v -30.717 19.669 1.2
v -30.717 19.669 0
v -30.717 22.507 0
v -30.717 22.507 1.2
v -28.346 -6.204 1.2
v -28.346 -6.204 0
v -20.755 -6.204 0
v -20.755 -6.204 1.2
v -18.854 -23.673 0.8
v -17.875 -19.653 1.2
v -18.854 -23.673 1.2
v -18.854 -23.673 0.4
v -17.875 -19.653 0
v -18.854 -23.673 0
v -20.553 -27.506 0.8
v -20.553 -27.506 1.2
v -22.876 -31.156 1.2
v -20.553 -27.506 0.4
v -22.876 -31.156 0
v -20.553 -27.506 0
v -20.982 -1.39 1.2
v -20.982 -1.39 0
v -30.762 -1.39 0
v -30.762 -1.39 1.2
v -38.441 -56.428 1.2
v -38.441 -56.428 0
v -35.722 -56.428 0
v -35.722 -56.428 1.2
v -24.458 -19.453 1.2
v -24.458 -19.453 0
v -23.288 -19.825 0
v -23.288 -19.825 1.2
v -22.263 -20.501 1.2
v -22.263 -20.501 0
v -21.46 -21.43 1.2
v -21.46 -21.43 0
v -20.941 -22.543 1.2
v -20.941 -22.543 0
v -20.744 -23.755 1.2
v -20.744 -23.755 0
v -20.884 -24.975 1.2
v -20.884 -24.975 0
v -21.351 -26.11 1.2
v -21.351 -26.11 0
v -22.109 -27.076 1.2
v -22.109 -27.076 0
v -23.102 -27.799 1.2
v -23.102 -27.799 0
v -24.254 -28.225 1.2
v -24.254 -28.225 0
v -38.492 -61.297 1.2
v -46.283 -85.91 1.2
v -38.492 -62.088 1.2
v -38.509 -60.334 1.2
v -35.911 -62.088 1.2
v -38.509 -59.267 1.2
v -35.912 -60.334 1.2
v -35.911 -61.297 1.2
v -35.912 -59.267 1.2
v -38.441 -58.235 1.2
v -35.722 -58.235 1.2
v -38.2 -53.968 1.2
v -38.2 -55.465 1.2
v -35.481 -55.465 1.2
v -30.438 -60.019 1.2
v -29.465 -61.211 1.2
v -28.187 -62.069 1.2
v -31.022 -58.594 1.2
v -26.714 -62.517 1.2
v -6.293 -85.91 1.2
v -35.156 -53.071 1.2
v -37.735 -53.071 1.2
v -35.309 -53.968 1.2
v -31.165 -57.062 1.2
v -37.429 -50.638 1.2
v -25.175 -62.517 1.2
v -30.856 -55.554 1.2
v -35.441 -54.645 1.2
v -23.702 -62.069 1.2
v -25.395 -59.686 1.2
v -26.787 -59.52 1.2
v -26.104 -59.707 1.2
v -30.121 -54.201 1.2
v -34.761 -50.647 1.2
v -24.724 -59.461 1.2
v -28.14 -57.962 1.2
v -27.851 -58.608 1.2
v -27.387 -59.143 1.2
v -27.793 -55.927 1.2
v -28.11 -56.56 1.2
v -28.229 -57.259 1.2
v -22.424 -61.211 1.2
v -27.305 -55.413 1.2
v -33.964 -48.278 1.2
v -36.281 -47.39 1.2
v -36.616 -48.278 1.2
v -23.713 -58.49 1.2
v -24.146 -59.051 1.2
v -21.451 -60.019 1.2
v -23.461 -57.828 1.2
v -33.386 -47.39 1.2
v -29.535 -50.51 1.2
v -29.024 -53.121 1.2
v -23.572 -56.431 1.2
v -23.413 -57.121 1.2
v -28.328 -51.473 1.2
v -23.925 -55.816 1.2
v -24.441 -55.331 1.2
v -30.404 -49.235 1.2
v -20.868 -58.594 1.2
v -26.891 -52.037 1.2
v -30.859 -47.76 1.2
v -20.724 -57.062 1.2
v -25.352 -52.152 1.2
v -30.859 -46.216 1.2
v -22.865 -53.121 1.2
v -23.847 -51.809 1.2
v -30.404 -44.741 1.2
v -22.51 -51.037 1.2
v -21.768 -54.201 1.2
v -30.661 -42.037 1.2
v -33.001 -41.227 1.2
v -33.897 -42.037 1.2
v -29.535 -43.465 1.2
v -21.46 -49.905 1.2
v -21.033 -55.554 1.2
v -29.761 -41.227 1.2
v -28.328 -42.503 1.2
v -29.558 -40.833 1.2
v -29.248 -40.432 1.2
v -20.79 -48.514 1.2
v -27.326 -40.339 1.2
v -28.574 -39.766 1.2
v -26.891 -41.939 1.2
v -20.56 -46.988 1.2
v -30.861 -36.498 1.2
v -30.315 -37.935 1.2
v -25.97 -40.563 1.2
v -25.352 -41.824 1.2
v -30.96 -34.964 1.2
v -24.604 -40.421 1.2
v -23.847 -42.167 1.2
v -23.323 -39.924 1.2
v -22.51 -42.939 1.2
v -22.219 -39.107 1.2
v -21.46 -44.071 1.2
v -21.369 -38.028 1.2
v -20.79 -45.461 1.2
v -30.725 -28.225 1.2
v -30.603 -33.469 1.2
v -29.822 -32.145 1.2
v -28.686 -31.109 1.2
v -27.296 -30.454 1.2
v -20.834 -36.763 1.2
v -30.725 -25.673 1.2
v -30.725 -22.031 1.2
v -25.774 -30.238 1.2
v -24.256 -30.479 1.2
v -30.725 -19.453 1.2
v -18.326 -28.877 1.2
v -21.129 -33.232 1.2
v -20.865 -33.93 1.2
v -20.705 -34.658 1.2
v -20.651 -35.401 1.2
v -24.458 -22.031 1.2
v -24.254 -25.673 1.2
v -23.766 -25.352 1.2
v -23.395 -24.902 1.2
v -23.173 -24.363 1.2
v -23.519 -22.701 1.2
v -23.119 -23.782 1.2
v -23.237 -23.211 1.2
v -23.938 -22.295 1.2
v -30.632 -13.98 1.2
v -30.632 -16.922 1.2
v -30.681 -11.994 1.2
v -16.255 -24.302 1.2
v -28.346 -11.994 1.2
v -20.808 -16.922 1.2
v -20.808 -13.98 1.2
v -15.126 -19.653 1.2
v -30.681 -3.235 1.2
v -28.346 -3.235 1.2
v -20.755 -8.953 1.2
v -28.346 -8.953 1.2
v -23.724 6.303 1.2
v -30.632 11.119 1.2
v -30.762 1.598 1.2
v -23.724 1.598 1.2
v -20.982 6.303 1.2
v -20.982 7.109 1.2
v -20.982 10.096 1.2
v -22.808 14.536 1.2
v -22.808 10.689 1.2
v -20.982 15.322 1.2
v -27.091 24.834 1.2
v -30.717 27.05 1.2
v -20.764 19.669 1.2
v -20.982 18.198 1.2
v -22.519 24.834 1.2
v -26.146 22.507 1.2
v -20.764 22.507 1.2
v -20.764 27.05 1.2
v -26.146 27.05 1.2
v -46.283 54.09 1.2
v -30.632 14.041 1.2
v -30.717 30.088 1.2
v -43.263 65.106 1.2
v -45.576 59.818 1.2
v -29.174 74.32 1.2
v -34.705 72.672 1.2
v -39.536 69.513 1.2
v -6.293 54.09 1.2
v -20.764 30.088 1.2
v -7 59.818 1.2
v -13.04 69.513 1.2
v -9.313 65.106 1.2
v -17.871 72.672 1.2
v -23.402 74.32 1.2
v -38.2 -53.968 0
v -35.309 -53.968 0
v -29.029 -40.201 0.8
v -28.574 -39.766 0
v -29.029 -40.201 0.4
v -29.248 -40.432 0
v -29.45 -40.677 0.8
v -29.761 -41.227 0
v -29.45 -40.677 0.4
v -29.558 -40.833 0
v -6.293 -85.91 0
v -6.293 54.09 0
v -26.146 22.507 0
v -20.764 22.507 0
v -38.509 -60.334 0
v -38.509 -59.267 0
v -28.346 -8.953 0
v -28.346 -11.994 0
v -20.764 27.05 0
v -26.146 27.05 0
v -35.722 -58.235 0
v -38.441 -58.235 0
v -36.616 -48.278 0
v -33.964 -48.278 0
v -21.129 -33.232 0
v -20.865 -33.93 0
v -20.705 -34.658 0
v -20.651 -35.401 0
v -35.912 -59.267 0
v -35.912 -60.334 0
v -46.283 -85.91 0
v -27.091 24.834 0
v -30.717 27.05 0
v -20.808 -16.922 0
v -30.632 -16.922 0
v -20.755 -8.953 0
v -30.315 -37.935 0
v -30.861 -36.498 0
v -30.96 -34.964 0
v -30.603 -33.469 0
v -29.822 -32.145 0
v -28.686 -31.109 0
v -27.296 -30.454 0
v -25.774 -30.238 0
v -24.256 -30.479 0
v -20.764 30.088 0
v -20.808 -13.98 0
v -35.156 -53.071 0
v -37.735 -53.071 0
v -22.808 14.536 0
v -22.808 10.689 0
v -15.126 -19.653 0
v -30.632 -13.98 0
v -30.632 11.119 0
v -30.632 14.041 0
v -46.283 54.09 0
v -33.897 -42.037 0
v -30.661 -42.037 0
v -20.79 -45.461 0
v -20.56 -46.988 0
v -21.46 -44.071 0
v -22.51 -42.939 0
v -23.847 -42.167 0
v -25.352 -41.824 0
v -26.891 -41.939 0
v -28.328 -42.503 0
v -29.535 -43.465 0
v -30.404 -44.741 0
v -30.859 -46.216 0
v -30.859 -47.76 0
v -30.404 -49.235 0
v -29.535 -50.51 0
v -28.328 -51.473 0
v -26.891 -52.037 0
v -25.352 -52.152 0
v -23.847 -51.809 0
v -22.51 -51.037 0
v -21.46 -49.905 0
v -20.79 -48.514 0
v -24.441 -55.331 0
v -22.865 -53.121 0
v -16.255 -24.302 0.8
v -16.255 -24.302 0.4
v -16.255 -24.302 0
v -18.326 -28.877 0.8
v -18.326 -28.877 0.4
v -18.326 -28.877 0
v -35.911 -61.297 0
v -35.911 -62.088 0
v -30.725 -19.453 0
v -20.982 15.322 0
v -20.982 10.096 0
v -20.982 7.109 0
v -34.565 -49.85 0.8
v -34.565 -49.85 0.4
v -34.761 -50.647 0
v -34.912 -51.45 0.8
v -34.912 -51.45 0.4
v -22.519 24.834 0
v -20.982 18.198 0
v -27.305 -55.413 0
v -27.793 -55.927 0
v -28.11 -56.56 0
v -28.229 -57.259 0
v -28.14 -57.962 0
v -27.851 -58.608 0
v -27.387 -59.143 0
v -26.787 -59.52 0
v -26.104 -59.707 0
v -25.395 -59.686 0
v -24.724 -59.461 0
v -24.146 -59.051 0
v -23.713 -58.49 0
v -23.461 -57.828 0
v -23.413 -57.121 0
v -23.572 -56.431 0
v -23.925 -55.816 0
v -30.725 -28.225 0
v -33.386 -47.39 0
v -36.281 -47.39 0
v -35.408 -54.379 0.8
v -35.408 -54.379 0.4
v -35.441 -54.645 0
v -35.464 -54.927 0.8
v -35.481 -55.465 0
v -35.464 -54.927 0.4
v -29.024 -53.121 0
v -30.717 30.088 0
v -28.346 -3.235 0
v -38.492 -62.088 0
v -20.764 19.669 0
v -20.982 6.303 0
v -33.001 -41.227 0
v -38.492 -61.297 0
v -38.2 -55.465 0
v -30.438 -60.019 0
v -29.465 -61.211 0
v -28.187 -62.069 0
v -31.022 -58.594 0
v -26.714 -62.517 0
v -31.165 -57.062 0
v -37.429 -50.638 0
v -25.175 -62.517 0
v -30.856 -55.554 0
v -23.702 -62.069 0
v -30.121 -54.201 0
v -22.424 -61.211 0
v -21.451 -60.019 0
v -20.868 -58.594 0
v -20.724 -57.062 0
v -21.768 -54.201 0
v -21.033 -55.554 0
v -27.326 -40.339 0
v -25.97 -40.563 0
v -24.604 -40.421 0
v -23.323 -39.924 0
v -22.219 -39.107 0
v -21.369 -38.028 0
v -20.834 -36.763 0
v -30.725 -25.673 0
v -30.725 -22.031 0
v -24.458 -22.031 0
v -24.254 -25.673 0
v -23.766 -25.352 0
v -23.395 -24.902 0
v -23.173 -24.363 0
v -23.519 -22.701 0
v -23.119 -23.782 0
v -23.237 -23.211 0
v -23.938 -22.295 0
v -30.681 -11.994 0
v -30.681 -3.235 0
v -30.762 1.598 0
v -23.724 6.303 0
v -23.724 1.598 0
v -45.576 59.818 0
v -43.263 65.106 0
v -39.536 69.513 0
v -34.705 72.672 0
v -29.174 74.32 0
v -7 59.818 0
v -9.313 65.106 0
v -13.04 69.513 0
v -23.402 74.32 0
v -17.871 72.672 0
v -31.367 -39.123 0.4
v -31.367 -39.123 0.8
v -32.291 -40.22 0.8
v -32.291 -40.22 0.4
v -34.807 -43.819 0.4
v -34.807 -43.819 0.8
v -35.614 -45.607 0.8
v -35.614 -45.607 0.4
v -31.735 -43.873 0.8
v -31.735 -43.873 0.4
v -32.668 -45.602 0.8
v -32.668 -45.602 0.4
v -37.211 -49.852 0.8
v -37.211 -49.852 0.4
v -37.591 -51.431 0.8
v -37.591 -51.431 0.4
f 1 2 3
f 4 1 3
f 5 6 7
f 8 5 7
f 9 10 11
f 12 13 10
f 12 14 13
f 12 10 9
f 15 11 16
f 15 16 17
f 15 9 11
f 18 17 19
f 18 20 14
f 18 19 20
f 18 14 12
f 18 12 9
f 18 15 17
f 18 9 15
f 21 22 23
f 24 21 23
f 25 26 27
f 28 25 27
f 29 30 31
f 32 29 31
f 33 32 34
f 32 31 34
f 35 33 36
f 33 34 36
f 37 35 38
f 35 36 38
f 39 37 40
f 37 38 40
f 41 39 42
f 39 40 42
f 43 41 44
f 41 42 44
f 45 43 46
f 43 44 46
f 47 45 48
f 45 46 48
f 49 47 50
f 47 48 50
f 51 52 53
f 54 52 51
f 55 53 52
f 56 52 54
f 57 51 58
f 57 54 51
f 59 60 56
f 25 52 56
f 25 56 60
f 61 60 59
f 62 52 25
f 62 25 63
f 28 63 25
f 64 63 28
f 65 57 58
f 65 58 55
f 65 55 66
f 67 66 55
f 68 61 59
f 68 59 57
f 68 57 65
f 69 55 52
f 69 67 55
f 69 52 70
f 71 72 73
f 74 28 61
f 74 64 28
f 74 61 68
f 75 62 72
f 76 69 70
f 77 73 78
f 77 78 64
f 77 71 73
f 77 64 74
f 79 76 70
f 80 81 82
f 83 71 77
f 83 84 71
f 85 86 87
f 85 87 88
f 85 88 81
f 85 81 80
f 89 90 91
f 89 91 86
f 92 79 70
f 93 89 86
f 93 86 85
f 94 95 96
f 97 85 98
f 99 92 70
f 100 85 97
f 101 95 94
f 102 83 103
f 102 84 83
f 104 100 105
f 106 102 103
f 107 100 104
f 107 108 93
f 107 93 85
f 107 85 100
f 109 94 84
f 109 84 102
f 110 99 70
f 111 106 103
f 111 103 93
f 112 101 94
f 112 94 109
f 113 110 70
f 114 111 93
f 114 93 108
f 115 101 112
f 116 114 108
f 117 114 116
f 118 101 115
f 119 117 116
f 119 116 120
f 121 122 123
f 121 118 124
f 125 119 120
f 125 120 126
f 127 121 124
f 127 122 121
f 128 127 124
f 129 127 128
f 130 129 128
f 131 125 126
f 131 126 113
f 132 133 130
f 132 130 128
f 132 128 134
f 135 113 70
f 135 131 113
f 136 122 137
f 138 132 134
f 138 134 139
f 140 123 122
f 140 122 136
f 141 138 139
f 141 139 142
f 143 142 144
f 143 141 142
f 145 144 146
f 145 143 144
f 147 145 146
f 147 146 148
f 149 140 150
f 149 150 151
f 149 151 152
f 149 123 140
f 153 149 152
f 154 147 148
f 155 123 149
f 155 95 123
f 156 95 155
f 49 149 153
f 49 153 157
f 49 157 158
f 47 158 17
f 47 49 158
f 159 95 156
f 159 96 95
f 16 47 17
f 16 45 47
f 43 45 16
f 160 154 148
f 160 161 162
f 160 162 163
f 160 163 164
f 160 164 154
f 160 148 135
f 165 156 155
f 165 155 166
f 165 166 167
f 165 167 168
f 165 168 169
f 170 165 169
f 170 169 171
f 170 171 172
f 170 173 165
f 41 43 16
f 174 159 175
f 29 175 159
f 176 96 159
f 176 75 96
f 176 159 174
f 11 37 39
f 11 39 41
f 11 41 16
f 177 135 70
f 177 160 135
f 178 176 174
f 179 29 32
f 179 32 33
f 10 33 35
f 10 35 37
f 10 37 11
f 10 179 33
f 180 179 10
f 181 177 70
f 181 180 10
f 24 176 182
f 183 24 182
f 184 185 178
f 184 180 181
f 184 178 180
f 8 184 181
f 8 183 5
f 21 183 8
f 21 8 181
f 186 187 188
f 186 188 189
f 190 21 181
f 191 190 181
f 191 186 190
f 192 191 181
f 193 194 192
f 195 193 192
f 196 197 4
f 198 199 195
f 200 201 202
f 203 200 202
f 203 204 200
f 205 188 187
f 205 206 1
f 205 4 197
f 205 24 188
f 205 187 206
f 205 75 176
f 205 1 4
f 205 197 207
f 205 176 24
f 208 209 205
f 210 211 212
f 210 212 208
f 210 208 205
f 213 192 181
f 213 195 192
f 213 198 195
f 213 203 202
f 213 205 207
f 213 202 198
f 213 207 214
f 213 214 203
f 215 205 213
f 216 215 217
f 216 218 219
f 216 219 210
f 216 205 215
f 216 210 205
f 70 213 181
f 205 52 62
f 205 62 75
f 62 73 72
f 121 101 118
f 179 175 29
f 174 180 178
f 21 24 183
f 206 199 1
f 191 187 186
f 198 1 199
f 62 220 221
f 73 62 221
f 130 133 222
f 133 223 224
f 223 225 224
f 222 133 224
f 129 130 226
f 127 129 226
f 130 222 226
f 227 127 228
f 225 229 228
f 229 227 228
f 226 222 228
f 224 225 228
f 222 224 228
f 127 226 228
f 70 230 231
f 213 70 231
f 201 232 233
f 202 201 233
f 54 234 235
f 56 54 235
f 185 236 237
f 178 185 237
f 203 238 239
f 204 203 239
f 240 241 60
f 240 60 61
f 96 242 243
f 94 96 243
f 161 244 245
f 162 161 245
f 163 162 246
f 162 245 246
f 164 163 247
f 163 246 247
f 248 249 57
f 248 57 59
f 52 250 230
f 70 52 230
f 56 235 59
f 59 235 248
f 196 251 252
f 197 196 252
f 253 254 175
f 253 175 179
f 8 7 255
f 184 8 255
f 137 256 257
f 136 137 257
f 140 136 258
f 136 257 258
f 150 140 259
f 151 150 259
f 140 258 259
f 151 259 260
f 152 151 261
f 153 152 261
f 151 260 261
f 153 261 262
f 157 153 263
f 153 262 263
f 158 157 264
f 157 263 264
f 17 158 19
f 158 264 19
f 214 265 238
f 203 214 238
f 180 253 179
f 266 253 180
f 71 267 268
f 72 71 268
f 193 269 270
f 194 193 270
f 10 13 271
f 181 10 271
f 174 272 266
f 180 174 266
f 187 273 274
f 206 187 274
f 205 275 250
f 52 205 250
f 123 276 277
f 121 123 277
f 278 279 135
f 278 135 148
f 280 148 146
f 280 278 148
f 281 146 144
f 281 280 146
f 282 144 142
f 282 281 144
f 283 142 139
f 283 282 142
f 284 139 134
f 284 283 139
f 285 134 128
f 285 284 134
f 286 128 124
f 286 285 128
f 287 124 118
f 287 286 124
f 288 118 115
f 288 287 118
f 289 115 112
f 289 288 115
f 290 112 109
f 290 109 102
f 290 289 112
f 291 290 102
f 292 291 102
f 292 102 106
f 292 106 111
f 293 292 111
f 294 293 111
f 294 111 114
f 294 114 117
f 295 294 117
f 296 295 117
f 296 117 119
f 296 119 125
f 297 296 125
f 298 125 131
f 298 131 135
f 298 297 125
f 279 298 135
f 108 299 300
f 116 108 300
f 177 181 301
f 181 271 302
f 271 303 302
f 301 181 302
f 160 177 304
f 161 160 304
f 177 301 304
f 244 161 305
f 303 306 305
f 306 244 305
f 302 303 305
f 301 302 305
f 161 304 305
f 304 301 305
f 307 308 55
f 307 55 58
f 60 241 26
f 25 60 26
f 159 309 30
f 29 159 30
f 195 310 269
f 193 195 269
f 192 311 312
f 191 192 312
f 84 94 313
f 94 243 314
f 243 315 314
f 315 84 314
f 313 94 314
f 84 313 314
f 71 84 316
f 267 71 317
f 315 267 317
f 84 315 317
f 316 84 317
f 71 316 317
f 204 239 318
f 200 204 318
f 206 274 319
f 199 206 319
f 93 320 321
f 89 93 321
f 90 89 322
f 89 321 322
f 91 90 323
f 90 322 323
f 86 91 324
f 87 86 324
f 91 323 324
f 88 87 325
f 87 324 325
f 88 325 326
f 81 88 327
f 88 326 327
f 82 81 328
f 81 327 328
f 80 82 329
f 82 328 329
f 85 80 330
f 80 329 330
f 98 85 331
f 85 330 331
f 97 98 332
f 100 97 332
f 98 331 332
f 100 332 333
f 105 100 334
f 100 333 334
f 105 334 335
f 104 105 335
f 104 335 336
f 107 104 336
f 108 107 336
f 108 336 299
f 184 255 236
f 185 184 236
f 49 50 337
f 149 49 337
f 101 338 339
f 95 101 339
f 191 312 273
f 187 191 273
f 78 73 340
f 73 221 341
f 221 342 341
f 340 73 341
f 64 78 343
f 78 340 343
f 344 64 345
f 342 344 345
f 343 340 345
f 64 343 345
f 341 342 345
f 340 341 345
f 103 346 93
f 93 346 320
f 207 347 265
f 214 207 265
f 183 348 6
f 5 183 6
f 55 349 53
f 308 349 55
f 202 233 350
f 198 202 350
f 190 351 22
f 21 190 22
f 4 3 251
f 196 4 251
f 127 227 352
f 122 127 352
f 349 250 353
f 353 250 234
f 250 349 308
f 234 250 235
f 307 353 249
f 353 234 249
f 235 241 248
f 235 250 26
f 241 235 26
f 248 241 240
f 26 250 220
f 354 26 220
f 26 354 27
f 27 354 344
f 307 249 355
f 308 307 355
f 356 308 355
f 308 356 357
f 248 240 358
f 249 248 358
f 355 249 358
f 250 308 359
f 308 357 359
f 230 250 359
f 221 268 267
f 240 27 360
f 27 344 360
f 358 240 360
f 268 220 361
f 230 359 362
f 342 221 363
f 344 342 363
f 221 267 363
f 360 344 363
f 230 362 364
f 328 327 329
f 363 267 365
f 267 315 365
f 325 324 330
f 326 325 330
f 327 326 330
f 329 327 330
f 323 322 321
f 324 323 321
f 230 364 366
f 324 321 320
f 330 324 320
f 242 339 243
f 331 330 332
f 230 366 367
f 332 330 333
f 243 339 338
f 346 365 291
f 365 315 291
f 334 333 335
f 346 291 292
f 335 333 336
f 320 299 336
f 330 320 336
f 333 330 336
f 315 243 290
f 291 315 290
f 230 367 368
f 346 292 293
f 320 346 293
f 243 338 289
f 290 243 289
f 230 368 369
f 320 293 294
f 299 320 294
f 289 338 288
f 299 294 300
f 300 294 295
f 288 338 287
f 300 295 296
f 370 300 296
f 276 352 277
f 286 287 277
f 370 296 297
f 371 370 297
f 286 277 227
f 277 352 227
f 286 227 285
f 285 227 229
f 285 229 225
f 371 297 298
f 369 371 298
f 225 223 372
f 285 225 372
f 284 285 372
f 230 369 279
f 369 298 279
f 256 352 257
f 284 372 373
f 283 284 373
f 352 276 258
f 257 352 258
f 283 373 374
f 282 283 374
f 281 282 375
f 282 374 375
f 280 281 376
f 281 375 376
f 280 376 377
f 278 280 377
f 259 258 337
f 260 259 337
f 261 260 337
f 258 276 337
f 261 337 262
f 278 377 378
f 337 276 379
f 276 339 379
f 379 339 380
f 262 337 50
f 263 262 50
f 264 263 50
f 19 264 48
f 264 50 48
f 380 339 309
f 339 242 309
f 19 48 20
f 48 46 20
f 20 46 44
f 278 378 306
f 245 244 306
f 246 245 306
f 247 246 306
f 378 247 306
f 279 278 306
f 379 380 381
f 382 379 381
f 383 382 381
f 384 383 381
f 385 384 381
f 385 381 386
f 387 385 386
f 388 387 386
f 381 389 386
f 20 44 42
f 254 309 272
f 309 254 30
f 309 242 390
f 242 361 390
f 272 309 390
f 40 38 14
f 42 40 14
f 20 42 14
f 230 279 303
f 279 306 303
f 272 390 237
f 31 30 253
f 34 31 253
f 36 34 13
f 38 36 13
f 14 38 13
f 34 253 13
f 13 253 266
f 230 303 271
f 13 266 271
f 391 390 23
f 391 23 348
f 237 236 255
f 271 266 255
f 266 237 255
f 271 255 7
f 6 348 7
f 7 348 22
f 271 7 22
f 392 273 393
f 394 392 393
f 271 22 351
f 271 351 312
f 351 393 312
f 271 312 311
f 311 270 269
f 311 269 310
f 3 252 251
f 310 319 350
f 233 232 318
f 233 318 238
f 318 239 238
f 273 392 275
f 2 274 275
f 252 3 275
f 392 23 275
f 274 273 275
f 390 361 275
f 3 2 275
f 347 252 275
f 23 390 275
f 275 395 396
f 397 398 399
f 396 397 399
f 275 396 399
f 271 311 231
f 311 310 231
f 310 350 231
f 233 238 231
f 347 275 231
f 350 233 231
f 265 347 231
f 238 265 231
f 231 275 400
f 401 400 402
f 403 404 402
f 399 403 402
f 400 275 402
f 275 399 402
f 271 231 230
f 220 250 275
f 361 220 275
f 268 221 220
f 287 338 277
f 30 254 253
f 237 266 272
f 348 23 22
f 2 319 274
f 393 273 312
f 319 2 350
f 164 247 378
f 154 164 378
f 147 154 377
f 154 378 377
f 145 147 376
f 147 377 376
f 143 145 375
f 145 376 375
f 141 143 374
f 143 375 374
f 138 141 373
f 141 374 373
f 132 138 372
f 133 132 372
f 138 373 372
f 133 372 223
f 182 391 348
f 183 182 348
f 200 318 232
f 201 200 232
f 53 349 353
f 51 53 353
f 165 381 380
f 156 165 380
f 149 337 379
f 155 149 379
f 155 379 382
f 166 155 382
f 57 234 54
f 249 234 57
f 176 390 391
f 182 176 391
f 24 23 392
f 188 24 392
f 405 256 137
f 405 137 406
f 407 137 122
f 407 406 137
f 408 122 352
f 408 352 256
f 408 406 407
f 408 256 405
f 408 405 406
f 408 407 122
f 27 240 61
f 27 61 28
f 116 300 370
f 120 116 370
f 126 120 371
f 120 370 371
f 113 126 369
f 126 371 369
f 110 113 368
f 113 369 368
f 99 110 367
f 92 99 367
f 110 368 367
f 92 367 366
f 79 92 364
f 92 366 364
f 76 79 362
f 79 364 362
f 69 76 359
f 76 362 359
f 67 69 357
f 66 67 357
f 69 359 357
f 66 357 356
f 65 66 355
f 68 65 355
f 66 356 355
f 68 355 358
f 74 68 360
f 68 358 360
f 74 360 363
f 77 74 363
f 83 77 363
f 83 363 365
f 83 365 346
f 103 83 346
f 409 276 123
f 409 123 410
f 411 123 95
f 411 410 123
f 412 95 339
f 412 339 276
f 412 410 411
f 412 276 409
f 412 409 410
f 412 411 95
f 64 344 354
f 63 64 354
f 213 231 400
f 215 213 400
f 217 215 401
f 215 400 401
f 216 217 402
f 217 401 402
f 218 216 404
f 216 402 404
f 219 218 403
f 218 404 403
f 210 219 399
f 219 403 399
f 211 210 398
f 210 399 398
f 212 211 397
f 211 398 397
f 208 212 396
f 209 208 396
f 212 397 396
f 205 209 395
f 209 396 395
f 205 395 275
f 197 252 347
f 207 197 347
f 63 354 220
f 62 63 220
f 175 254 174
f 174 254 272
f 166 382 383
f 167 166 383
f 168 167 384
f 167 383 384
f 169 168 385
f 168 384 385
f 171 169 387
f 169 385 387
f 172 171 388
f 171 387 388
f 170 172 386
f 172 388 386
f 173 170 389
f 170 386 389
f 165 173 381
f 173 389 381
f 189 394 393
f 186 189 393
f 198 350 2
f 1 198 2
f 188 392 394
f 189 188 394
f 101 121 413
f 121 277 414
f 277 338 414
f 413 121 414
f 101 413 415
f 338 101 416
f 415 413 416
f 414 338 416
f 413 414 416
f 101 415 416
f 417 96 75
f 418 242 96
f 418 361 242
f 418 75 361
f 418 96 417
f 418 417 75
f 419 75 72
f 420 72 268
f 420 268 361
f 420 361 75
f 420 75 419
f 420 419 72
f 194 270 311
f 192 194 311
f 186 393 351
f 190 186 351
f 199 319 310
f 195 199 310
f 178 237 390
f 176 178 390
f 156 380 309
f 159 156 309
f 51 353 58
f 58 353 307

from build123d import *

# Parameters (mm, degrees)
F0_W     = 2.581628
F0_H     = 0.791415
F0_W_2   = 2.597917
F0_H_2   = 1.066693
F0_W_3   = 2.718348
F0_H_3   = 1.806498
F0_R     = 5.178657
F0_W_4   = 9.823907
F0_H_4   = 2.942012
F1_DEPTH = 1.2


with BuildPart() as f1:
    # F0 (on Top) → F1 (new body)
    with BuildSketch(Plane.XY):
        with BuildLine():
            Line((-6.29297, -85.910204), (-6.29297, 54.089796))
            ThreePointArc((-6.29297, 54.089796), (-26.288129, 74.529796), (-46.283289, 54.089796))
            Line((-46.283289, 54.089796), (-46.283289, -85.910204))
            Line((-46.283289, -85.910204), (-6.29297, -85.910204))
        make_face()
        with Locations((-37.201445, -61.692785)):
            Rectangle(F0_W, F0_H, mode=Mode.SUBTRACT)
        with Locations((-37.210507, -59.800263)):
            Rectangle(F0_W_2, F0_H_2, mode=Mode.SUBTRACT)
        with Locations((-37.081471, -57.331383)):
            Rectangle(F0_W_3, F0_H_3, mode=Mode.SUBTRACT)
        with BuildLine():
            Line((-35.481431, -55.46467), (-38.199779, -55.46467))
            Line((-38.199779, -55.46467), (-38.199779, -53.967856))
            Line((-38.199779, -53.967856), (-35.309382, -53.967856))
            add(Edge.make_bspline(
                [(-35.309382, -53.967856), (-35.429817, -54.260336), (-35.481431, -54.982934), (-35.481431, -55.46467)],
                knots=[0, 0, 0, 0, 1.50667, 1.50667, 1.50667, 1.50667], degree=3))
        make_face(mode=Mode.SUBTRACT)
        with BuildLine():
            Line((-35.155974, -53.070802), (-37.735078, -53.070802))
            add(Edge.make_bspline(
                [(-36.615845, -48.277561), (-37.310701, -49.868666), (-37.715785, -51.382598), (-37.735078, -53.070802)],
                knots=[0, 0, 0, 0, 4.922179, 4.922179, 4.922179, 4.922179], degree=3))
            Line((-36.615845, -48.277561), (-33.963747, -48.277561))
            add(Edge.make_bspline(
                [(-33.963747, -48.277561), (-34.742344, -49.834754), (-34.912664, -51.440611), (-35.155974, -53.070802)],
                knots=[0, 0, 0, 0, 4.939288, 4.939288, 4.939288, 4.939288], degree=3))
        make_face(mode=Mode.SUBTRACT)
        with BuildLine():
            add(Edge.make_bspline(
                [(-33.896647, -42.036764), (-34.845561, -43.812942), (-35.697155, -45.613449), (-36.281101, -47.389627)],
                knots=[0, 0, 0, 0, 5.859928, 5.859928, 5.859928, 5.859928], degree=3))
            Line((-33.896647, -42.036764), (-30.660599, -42.036764))
            add(Edge.make_bspline(
                [(-30.660599, -42.036764), (-31.779833, -43.983262), (-32.801744, -45.516126), (-33.38569, -47.389627)],
                knots=[0, 0, 0, 0, 6.006601, 6.006601, 6.006601, 6.006601], degree=3))
            Line((-33.38569, -47.389627), (-36.281101, -47.389627))
        make_face(mode=Mode.SUBTRACT)
        with BuildLine():
            Line((-29.023839, -53.121161), (-27.305199, -55.41268))
            ThreePointArc((-27.305199, -55.41268), (-25.748689, -59.722554), (-24.440799, -55.330839))
            Line((-24.440799, -55.330839), (-22.865377, -53.121161))
            ThreePointArc((-22.865377, -53.121161), (-25.944608, -62.574254), (-29.023839, -53.121161))
        make_face(mode=Mode.SUBTRACT)
        with Locations((-25.738571, -46.987876)):
            Circle(F0_R, mode=Mode.SUBTRACT)
        with BuildLine():
            add(Edge.make_bspline(
                [(-17.875146, -19.652883), (-18.462803, -23.768686), (-20.271629, -27.596692), (-22.875761, -31.155674)],
                knots=[0, 0, 0, 0, 12.542741, 12.542741, 12.542741, 12.542741], degree=3))
            Line((-17.875146, -19.652883), (-15.126339, -19.652883))
            add(Edge.make_bspline(
                [(-15.126339, -19.652883), (-15.713997, -24.289511), (-18.029595, -29.035197), (-21.1288, -33.232335)],
                knots=[0, 0, 0, 0, 14.846921, 14.846921, 14.846921, 14.846921], degree=3))
            ThreePointArc((-21.1288, -33.232335), (-20.771988, -34.290864), (-20.651166, -35.401359))
            ThreePointArc((-20.651166, -35.401359), (-23.323252, -39.924203), (-28.57408, -39.766207))
            add(Edge.make_bspline(
                [(-28.57408, -39.766207), (-29.019574, -40.191628), (-29.530527, -40.629588), (-29.760677, -41.22673)],
                knots=[0, 0, 0, 0, 1.881791, 1.881791, 1.881791, 1.881791], degree=3))
            Line((-29.760677, -41.22673), (-33.001378, -41.22673))
            add(Edge.make_bspline(
                [(-30.314623, -37.934667), (-31.40403, -39.169718), (-32.42594, -40.264621), (-33.001378, -41.22673)],
                knots=[0, 0, 0, 0, 4.249274, 4.249274, 4.249274, 4.249274], degree=3))
            ThreePointArc((-30.314623, -37.934667), (-29.293093, -31.584655), (-22.875761, -31.155674))
        make_face(mode=Mode.SUBTRACT)
        with BuildLine():
            Line((-30.725121, -25.672881), (-24.253521, -25.672881))
            ThreePointArc((-24.253521, -25.672881), (-23.118539, -23.782431), (-24.45812, -22.031))
            Line((-24.45812, -22.031), (-30.725121, -22.031))
            Line((-30.725121, -22.031), (-30.725121, -19.453041))
            Line((-30.725121, -19.453041), (-24.45812, -19.453041))
            ThreePointArc((-24.45812, -19.453041), (-20.744201, -23.754778), (-24.253521, -28.224992))
            Line((-24.253521, -28.224992), (-30.725121, -28.224992))
            Line((-30.725121, -28.224992), (-30.725121, -25.672881))
        make_face(mode=Mode.SUBTRACT)
        with Locations((-25.720231, -15.450788)):
            Rectangle(F0_W_4, F0_H_4, mode=Mode.SUBTRACT)
        Polygon((-30.681022, -11.994411), (-30.681022, -3.235085), (-28.346451, -3.235186), (-28.346451, -6.20359), (-20.755121, -6.20359), (-20.755121, -8.953013), (-28.346451, -8.953013), (-28.346451, -11.994411), align=None, mode=Mode.SUBTRACT)
        Polygon((-30.762237, -1.389609), (-30.762237, 1.597551), (-23.723995, 1.597551), (-23.723995, 6.303352), (-20.982355, 6.303352), (-20.982355, -1.389609), align=None, mode=Mode.SUBTRACT)
        Polygon((-30.632185, 14.041182), (-20.982355, 18.198028), (-20.982355, 15.322189), (-22.808162, 14.535688), (-22.808162, 10.689207), (-20.982355, 10.095867), (-20.982355, 7.108707), (-30.632185, 11.118867), align=None, mode=Mode.SUBTRACT)
        Polygon((-20.763781, 22.507036), (-20.763781, 19.669064), (-30.717358, 19.669064), (-30.717358, 22.507036), (-27.090734, 24.833532), (-30.717358, 27.049802), (-30.717358, 30.087957), (-20.763781, 30.087957), (-20.763781, 27.049802), (-26.145658, 27.049802), (-22.519033, 24.833532), (-26.145658, 22.507036), align=None, mode=Mode.SUBTRACT)
    extrude(amount=F1_DEPTH)


solid = f1.part
